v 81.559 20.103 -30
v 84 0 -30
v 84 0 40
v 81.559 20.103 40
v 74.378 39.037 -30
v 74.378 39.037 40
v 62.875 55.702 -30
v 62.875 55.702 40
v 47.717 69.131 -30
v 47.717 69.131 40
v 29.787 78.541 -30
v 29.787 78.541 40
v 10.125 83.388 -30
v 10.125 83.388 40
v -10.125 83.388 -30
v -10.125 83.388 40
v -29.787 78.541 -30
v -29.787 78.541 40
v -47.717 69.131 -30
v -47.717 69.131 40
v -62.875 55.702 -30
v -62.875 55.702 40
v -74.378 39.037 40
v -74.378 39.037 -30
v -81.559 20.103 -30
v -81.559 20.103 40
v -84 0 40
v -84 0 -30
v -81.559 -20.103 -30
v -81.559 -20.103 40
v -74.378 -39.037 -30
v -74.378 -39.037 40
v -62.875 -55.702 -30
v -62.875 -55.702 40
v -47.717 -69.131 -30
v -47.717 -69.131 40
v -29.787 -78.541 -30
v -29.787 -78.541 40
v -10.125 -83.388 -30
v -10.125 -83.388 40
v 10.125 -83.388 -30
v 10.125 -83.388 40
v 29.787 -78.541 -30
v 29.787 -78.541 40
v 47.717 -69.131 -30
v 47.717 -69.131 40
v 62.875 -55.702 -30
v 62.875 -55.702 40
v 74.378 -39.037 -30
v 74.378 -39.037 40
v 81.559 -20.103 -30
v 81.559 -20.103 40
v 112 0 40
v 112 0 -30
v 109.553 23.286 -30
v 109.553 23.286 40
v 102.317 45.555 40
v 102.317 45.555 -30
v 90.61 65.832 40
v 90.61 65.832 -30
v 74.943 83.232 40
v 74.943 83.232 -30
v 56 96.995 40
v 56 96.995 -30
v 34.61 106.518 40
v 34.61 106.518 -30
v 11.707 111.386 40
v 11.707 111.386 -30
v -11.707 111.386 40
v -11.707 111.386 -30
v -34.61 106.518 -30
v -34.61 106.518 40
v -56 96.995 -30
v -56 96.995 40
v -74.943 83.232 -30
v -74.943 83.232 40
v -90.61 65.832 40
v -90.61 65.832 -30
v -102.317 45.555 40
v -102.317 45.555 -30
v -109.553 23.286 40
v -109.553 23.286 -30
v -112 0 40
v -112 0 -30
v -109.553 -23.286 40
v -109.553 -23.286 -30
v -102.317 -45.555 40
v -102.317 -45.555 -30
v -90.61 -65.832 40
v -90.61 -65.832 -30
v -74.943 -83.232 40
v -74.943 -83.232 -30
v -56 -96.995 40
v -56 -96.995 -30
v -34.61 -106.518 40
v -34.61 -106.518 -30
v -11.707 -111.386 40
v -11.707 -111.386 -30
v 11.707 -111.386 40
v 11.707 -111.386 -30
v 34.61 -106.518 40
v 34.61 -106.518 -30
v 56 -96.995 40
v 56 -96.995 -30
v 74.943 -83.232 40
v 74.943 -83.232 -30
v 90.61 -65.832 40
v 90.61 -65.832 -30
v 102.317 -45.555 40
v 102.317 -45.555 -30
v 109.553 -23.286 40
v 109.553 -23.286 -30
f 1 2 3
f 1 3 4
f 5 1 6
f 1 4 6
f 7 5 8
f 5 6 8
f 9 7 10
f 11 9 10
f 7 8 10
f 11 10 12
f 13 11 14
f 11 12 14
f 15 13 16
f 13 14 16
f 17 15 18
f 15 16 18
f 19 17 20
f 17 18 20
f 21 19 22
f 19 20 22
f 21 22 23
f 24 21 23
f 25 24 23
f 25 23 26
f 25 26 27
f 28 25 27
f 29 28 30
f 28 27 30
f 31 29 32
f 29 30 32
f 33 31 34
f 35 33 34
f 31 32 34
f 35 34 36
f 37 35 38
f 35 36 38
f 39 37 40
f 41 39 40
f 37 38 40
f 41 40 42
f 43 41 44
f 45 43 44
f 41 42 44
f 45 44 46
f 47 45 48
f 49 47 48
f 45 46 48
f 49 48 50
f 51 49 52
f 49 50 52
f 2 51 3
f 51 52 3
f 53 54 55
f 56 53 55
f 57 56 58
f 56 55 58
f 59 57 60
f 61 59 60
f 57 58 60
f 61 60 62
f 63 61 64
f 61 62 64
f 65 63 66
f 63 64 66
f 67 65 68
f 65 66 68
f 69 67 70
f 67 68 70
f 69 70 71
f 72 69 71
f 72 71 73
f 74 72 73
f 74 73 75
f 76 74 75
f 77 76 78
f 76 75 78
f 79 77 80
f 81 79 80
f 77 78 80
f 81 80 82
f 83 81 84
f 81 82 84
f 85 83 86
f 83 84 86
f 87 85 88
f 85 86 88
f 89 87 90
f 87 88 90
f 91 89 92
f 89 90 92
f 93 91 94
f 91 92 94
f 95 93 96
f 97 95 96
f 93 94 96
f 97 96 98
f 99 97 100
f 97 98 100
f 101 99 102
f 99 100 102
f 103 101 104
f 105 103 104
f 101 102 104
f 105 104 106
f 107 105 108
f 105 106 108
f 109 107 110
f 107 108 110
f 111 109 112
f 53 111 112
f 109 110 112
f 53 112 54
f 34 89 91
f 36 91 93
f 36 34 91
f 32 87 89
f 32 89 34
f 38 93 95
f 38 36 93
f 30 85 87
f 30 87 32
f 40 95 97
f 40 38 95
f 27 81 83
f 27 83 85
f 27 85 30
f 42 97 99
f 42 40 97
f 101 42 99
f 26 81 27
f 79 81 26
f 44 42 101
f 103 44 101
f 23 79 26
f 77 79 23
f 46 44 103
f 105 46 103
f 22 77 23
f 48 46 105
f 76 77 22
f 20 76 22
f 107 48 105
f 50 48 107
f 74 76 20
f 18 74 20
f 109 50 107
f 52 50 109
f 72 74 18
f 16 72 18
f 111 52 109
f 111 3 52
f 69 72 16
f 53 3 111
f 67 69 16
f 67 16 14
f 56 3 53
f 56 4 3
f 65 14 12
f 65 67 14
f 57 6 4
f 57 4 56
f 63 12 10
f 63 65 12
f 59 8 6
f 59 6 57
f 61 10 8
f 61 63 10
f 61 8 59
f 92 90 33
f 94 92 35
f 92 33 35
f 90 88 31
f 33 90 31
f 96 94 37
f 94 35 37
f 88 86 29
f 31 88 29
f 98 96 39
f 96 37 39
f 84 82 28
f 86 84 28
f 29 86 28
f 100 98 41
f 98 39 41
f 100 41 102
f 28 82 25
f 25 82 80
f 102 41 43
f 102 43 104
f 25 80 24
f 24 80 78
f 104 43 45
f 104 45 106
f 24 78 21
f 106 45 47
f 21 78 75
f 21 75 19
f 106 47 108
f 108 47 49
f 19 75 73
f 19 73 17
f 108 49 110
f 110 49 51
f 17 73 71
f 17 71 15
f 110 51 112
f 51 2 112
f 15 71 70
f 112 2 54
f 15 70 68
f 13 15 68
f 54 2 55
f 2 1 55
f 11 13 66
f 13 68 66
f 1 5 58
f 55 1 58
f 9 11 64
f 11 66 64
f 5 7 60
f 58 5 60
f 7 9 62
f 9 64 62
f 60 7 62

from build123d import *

# Parameters (mm, degrees)
CROQUIS3_R              = 16
SALIENTE_EXTRUIR2_DEPTH = 10
CROQUIS4_R              = 12
CORTAR_EXTRUIR1_DEPTH   = 10
ESCALA1_SCALE           = 7


with BuildPart() as part:
    # Croquis3 → Saliente-Extruir2 (new body)
    with BuildSketch(Plane.XY):
        Circle(CROQUIS3_R)
    extrude(amount=SALIENTE_EXTRUIR2_DEPTH)

    # Croquis4 → Cortar-Extruir1 (cut)
    with BuildSketch(Plane.XY.offset(10)):
        Circle(CROQUIS4_R)
    extrude(amount=-CORTAR_EXTRUIR1_DEPTH, mode=Mode.SUBTRACT)


with BuildPart() as part_1:
    # Escala1: scaled about (0, 0, 5)
    add(part.part.scale(ESCALA1_SCALE).moved(Location((0, 0, -30))))


solid = part_1.part
